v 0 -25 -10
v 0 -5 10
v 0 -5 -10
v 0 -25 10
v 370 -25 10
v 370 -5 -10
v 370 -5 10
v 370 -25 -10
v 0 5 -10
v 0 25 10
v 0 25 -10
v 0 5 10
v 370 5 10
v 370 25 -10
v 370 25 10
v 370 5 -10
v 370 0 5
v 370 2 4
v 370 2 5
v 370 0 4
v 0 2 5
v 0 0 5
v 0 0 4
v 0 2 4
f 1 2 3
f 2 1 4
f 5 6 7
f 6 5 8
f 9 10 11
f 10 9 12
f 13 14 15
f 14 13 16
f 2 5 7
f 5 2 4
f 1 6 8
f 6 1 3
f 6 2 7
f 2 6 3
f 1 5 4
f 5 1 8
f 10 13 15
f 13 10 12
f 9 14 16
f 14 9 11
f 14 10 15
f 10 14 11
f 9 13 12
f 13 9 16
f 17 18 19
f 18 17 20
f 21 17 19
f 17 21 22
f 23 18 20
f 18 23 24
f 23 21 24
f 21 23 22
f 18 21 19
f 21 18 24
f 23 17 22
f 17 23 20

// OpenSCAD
module assembly_preview() {
  rod_d = 8.0;
  rod_spacing = 40.0;
  rod_len = 370.0;
  
  module rods(){
    color([0.7,0.7,0.7]) {
      translate([0, -rod_spacing/2, 0]) rotate([0,90,0]) cylinder(h=rod_len, d=rod_d, center=false);
      translate([0,  rod_spacing/2, 0]) rotate([0,90,0]) cylinder(h=rod_len, d=rod_d, center=false);
    }
  }
  rods();
  color([0.3,0.3,0.3]) translate([0, -25, -10]) cube([rod_len, 20, 20], center=false);
  color([0.3,0.3,0.3]) translate([0,  5, -10]) cube([rod_len, 20, 20], center=false);
  color([0.1,0.1,0.1]) translate([0,0,rod_d/2]) cube([rod_len, 2, 1], center=false);
  // Import and position printable parts manually if you want a full assembly preview.
}
assembly_preview();
